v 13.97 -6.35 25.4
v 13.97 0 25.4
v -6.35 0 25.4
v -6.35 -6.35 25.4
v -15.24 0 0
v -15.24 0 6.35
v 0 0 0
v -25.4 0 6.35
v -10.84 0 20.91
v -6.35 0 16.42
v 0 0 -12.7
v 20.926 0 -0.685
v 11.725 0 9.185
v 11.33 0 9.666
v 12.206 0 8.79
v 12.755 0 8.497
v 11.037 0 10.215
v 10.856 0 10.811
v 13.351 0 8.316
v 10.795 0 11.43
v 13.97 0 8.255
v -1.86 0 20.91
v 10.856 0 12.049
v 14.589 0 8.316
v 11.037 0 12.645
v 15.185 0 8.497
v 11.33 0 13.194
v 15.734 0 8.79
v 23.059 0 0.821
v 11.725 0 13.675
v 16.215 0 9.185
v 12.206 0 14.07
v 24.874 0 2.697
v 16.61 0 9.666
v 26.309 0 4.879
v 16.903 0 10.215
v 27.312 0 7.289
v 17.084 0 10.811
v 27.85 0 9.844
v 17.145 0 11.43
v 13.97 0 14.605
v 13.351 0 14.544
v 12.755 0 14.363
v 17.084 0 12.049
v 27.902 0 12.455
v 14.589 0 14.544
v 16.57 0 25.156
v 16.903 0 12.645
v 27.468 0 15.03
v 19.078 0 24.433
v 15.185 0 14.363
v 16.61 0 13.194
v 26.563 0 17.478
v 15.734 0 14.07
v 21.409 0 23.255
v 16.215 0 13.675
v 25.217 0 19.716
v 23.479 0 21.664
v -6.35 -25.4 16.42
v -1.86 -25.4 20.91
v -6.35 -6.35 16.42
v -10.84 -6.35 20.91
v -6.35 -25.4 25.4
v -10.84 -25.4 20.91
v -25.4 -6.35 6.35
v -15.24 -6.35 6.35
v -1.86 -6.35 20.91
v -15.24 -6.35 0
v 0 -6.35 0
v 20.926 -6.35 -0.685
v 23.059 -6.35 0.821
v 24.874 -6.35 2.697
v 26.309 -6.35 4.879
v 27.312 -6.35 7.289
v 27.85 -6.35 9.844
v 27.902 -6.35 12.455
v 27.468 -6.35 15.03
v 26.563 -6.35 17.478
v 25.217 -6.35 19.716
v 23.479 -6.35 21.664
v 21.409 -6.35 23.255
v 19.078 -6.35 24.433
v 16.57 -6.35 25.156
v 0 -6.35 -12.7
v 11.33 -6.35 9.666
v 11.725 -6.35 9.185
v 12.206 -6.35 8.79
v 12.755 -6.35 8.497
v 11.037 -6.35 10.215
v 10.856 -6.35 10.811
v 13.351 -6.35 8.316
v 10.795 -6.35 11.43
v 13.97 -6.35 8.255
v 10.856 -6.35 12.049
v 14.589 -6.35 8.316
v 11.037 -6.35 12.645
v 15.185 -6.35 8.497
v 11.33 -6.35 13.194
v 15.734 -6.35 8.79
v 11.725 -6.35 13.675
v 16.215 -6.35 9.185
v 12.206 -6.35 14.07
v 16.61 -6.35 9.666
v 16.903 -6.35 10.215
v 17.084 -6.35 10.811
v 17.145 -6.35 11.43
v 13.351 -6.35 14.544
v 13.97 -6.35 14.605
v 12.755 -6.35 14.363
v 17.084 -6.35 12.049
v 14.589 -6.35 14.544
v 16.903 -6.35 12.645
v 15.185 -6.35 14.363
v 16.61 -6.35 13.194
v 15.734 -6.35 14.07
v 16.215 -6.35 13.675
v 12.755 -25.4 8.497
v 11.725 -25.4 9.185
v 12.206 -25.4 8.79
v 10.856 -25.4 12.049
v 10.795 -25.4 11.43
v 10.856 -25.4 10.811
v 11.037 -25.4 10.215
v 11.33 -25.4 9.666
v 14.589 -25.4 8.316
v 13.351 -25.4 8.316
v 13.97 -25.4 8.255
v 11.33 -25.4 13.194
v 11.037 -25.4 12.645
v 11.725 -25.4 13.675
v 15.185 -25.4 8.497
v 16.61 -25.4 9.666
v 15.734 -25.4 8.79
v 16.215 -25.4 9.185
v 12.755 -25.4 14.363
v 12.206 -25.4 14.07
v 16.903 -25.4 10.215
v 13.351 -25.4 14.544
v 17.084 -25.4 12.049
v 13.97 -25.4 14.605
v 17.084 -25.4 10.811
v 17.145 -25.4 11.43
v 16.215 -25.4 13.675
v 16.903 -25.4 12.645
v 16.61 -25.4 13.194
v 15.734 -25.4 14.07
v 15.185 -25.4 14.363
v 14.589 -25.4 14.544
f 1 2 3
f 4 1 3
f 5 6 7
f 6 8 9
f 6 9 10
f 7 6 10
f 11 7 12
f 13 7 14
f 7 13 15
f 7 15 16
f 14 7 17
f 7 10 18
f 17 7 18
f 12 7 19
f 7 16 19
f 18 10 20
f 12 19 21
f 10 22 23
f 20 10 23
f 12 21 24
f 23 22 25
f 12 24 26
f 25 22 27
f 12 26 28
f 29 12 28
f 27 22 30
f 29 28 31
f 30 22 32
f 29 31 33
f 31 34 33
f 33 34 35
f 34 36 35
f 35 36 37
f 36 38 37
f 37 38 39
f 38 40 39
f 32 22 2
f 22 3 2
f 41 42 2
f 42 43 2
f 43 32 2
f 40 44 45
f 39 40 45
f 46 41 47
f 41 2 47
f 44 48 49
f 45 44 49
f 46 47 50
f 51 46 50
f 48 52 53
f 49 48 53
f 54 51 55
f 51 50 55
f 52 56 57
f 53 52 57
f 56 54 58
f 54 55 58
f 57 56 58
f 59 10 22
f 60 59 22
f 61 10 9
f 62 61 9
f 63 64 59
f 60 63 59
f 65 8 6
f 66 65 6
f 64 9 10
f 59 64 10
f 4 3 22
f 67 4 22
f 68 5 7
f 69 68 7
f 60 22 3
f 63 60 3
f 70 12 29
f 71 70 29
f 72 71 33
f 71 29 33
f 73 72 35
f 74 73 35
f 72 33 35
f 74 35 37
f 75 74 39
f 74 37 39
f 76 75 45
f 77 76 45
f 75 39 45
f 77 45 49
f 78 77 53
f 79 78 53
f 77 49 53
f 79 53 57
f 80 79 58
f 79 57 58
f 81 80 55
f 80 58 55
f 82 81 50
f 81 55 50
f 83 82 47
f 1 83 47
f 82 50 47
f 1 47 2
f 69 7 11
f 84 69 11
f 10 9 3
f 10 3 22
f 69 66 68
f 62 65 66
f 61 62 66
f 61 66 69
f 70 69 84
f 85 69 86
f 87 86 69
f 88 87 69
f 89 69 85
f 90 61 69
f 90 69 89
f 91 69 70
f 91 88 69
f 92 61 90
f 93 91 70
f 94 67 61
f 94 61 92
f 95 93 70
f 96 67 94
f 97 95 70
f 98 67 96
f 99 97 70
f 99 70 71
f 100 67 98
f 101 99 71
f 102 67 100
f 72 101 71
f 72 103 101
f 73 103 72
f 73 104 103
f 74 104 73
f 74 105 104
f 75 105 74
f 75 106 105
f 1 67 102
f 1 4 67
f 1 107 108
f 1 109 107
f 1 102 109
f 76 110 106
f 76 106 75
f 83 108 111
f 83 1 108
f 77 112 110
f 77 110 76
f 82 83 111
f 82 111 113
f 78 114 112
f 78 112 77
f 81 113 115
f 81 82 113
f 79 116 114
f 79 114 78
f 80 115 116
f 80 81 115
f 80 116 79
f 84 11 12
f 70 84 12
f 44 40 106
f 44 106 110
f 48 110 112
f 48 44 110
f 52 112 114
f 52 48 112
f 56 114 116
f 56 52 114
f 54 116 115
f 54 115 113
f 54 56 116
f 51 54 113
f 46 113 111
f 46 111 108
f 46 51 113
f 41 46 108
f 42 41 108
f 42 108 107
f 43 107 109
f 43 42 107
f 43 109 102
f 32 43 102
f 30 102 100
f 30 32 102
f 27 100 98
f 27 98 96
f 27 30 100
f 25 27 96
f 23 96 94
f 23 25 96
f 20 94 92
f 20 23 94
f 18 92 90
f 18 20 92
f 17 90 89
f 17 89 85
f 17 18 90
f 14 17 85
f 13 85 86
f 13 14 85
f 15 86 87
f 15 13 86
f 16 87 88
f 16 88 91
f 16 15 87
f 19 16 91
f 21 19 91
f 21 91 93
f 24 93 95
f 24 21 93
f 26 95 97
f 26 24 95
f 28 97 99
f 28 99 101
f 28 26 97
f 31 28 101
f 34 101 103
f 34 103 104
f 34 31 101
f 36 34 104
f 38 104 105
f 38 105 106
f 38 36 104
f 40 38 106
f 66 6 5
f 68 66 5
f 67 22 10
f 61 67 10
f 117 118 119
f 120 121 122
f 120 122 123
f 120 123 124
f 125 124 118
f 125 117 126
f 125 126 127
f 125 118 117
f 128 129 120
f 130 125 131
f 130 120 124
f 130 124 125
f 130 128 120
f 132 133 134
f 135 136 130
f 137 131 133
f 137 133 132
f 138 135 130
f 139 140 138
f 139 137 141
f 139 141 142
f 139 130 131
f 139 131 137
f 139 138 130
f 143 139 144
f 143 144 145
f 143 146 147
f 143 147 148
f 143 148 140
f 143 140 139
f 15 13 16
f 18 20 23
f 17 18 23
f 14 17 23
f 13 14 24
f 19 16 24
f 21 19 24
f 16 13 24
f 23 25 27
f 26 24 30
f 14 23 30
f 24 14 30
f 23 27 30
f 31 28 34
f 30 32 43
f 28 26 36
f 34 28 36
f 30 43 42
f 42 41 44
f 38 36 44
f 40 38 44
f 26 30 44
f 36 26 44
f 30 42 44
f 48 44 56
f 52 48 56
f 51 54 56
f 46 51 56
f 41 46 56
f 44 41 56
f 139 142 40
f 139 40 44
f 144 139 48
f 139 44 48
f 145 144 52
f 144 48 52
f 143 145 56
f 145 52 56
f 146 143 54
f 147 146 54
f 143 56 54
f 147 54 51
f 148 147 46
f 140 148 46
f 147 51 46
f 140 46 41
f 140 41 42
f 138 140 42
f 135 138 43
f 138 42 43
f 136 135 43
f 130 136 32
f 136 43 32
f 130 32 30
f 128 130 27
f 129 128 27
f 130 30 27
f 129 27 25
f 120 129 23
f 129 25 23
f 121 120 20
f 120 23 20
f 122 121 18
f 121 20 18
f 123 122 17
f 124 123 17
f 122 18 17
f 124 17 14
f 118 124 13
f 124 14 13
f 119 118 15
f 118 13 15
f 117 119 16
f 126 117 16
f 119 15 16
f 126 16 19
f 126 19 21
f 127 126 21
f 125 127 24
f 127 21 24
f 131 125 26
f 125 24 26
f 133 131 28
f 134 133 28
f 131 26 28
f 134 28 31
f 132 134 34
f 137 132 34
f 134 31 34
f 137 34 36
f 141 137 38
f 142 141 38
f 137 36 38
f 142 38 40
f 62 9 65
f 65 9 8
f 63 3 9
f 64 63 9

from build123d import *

# Parameters (mm, degrees)
F0_R     = 3.175
F1_DEPTH = 6.35
F2_R     = 3.175
F3_DEPTH = 25.4
F5_DEPTH = 25.4


with BuildPart() as f1:
    # F0 (on Front) → F1 (new body)
    with BuildSketch(Plane.XZ):
        with BuildLine():
            Line((-15.24, 0), (0, 0))
            Line((0, 0), (0, -12.7))
            Line((0, -12.7), (20.926017, -0.685062))
            ThreePointArc((20.926017, -0.685062), (27.468302, 15.029547), (13.97, 25.4))
            Line((13.97, 25.4), (-6.35, 25.4))
            Line((-6.35, 25.4), (-1.859872, 20.909872))
            Line((-1.859872, 20.909872), (-6.35, 16.419744))
            Line((-6.35, 16.419744), (-10.840128, 20.909872))
            Line((-10.840128, 20.909872), (-25.4, 6.35))
            Line((-25.4, 6.35), (-15.24, 6.35))
            Line((-15.24, 6.35), (-15.24, 0))
        make_face()
        with Locations((13.97, 11.43)):
            Circle(F0_R, mode=Mode.SUBTRACT)
    extrude(amount=F1_DEPTH)


with BuildPart() as f3:
    # F2 (on Front) → F3 (new body)
    with BuildSketch(Plane.XZ):
        with Locations((13.97, 11.43)):
            Circle(F2_R)
    extrude(amount=F3_DEPTH)


with BuildPart() as f5:
    # F4 (on Front) → F5 (new body)
    with BuildSketch(Plane.XZ):
        Polygon((-10.840128, 20.909872), (-6.35, 16.419744), (-1.859872, 20.909872), (-6.35, 25.4), align=None)
    extrude(amount=F5_DEPTH)


solid = Compound([f1.part, f3.part, f5.part])
